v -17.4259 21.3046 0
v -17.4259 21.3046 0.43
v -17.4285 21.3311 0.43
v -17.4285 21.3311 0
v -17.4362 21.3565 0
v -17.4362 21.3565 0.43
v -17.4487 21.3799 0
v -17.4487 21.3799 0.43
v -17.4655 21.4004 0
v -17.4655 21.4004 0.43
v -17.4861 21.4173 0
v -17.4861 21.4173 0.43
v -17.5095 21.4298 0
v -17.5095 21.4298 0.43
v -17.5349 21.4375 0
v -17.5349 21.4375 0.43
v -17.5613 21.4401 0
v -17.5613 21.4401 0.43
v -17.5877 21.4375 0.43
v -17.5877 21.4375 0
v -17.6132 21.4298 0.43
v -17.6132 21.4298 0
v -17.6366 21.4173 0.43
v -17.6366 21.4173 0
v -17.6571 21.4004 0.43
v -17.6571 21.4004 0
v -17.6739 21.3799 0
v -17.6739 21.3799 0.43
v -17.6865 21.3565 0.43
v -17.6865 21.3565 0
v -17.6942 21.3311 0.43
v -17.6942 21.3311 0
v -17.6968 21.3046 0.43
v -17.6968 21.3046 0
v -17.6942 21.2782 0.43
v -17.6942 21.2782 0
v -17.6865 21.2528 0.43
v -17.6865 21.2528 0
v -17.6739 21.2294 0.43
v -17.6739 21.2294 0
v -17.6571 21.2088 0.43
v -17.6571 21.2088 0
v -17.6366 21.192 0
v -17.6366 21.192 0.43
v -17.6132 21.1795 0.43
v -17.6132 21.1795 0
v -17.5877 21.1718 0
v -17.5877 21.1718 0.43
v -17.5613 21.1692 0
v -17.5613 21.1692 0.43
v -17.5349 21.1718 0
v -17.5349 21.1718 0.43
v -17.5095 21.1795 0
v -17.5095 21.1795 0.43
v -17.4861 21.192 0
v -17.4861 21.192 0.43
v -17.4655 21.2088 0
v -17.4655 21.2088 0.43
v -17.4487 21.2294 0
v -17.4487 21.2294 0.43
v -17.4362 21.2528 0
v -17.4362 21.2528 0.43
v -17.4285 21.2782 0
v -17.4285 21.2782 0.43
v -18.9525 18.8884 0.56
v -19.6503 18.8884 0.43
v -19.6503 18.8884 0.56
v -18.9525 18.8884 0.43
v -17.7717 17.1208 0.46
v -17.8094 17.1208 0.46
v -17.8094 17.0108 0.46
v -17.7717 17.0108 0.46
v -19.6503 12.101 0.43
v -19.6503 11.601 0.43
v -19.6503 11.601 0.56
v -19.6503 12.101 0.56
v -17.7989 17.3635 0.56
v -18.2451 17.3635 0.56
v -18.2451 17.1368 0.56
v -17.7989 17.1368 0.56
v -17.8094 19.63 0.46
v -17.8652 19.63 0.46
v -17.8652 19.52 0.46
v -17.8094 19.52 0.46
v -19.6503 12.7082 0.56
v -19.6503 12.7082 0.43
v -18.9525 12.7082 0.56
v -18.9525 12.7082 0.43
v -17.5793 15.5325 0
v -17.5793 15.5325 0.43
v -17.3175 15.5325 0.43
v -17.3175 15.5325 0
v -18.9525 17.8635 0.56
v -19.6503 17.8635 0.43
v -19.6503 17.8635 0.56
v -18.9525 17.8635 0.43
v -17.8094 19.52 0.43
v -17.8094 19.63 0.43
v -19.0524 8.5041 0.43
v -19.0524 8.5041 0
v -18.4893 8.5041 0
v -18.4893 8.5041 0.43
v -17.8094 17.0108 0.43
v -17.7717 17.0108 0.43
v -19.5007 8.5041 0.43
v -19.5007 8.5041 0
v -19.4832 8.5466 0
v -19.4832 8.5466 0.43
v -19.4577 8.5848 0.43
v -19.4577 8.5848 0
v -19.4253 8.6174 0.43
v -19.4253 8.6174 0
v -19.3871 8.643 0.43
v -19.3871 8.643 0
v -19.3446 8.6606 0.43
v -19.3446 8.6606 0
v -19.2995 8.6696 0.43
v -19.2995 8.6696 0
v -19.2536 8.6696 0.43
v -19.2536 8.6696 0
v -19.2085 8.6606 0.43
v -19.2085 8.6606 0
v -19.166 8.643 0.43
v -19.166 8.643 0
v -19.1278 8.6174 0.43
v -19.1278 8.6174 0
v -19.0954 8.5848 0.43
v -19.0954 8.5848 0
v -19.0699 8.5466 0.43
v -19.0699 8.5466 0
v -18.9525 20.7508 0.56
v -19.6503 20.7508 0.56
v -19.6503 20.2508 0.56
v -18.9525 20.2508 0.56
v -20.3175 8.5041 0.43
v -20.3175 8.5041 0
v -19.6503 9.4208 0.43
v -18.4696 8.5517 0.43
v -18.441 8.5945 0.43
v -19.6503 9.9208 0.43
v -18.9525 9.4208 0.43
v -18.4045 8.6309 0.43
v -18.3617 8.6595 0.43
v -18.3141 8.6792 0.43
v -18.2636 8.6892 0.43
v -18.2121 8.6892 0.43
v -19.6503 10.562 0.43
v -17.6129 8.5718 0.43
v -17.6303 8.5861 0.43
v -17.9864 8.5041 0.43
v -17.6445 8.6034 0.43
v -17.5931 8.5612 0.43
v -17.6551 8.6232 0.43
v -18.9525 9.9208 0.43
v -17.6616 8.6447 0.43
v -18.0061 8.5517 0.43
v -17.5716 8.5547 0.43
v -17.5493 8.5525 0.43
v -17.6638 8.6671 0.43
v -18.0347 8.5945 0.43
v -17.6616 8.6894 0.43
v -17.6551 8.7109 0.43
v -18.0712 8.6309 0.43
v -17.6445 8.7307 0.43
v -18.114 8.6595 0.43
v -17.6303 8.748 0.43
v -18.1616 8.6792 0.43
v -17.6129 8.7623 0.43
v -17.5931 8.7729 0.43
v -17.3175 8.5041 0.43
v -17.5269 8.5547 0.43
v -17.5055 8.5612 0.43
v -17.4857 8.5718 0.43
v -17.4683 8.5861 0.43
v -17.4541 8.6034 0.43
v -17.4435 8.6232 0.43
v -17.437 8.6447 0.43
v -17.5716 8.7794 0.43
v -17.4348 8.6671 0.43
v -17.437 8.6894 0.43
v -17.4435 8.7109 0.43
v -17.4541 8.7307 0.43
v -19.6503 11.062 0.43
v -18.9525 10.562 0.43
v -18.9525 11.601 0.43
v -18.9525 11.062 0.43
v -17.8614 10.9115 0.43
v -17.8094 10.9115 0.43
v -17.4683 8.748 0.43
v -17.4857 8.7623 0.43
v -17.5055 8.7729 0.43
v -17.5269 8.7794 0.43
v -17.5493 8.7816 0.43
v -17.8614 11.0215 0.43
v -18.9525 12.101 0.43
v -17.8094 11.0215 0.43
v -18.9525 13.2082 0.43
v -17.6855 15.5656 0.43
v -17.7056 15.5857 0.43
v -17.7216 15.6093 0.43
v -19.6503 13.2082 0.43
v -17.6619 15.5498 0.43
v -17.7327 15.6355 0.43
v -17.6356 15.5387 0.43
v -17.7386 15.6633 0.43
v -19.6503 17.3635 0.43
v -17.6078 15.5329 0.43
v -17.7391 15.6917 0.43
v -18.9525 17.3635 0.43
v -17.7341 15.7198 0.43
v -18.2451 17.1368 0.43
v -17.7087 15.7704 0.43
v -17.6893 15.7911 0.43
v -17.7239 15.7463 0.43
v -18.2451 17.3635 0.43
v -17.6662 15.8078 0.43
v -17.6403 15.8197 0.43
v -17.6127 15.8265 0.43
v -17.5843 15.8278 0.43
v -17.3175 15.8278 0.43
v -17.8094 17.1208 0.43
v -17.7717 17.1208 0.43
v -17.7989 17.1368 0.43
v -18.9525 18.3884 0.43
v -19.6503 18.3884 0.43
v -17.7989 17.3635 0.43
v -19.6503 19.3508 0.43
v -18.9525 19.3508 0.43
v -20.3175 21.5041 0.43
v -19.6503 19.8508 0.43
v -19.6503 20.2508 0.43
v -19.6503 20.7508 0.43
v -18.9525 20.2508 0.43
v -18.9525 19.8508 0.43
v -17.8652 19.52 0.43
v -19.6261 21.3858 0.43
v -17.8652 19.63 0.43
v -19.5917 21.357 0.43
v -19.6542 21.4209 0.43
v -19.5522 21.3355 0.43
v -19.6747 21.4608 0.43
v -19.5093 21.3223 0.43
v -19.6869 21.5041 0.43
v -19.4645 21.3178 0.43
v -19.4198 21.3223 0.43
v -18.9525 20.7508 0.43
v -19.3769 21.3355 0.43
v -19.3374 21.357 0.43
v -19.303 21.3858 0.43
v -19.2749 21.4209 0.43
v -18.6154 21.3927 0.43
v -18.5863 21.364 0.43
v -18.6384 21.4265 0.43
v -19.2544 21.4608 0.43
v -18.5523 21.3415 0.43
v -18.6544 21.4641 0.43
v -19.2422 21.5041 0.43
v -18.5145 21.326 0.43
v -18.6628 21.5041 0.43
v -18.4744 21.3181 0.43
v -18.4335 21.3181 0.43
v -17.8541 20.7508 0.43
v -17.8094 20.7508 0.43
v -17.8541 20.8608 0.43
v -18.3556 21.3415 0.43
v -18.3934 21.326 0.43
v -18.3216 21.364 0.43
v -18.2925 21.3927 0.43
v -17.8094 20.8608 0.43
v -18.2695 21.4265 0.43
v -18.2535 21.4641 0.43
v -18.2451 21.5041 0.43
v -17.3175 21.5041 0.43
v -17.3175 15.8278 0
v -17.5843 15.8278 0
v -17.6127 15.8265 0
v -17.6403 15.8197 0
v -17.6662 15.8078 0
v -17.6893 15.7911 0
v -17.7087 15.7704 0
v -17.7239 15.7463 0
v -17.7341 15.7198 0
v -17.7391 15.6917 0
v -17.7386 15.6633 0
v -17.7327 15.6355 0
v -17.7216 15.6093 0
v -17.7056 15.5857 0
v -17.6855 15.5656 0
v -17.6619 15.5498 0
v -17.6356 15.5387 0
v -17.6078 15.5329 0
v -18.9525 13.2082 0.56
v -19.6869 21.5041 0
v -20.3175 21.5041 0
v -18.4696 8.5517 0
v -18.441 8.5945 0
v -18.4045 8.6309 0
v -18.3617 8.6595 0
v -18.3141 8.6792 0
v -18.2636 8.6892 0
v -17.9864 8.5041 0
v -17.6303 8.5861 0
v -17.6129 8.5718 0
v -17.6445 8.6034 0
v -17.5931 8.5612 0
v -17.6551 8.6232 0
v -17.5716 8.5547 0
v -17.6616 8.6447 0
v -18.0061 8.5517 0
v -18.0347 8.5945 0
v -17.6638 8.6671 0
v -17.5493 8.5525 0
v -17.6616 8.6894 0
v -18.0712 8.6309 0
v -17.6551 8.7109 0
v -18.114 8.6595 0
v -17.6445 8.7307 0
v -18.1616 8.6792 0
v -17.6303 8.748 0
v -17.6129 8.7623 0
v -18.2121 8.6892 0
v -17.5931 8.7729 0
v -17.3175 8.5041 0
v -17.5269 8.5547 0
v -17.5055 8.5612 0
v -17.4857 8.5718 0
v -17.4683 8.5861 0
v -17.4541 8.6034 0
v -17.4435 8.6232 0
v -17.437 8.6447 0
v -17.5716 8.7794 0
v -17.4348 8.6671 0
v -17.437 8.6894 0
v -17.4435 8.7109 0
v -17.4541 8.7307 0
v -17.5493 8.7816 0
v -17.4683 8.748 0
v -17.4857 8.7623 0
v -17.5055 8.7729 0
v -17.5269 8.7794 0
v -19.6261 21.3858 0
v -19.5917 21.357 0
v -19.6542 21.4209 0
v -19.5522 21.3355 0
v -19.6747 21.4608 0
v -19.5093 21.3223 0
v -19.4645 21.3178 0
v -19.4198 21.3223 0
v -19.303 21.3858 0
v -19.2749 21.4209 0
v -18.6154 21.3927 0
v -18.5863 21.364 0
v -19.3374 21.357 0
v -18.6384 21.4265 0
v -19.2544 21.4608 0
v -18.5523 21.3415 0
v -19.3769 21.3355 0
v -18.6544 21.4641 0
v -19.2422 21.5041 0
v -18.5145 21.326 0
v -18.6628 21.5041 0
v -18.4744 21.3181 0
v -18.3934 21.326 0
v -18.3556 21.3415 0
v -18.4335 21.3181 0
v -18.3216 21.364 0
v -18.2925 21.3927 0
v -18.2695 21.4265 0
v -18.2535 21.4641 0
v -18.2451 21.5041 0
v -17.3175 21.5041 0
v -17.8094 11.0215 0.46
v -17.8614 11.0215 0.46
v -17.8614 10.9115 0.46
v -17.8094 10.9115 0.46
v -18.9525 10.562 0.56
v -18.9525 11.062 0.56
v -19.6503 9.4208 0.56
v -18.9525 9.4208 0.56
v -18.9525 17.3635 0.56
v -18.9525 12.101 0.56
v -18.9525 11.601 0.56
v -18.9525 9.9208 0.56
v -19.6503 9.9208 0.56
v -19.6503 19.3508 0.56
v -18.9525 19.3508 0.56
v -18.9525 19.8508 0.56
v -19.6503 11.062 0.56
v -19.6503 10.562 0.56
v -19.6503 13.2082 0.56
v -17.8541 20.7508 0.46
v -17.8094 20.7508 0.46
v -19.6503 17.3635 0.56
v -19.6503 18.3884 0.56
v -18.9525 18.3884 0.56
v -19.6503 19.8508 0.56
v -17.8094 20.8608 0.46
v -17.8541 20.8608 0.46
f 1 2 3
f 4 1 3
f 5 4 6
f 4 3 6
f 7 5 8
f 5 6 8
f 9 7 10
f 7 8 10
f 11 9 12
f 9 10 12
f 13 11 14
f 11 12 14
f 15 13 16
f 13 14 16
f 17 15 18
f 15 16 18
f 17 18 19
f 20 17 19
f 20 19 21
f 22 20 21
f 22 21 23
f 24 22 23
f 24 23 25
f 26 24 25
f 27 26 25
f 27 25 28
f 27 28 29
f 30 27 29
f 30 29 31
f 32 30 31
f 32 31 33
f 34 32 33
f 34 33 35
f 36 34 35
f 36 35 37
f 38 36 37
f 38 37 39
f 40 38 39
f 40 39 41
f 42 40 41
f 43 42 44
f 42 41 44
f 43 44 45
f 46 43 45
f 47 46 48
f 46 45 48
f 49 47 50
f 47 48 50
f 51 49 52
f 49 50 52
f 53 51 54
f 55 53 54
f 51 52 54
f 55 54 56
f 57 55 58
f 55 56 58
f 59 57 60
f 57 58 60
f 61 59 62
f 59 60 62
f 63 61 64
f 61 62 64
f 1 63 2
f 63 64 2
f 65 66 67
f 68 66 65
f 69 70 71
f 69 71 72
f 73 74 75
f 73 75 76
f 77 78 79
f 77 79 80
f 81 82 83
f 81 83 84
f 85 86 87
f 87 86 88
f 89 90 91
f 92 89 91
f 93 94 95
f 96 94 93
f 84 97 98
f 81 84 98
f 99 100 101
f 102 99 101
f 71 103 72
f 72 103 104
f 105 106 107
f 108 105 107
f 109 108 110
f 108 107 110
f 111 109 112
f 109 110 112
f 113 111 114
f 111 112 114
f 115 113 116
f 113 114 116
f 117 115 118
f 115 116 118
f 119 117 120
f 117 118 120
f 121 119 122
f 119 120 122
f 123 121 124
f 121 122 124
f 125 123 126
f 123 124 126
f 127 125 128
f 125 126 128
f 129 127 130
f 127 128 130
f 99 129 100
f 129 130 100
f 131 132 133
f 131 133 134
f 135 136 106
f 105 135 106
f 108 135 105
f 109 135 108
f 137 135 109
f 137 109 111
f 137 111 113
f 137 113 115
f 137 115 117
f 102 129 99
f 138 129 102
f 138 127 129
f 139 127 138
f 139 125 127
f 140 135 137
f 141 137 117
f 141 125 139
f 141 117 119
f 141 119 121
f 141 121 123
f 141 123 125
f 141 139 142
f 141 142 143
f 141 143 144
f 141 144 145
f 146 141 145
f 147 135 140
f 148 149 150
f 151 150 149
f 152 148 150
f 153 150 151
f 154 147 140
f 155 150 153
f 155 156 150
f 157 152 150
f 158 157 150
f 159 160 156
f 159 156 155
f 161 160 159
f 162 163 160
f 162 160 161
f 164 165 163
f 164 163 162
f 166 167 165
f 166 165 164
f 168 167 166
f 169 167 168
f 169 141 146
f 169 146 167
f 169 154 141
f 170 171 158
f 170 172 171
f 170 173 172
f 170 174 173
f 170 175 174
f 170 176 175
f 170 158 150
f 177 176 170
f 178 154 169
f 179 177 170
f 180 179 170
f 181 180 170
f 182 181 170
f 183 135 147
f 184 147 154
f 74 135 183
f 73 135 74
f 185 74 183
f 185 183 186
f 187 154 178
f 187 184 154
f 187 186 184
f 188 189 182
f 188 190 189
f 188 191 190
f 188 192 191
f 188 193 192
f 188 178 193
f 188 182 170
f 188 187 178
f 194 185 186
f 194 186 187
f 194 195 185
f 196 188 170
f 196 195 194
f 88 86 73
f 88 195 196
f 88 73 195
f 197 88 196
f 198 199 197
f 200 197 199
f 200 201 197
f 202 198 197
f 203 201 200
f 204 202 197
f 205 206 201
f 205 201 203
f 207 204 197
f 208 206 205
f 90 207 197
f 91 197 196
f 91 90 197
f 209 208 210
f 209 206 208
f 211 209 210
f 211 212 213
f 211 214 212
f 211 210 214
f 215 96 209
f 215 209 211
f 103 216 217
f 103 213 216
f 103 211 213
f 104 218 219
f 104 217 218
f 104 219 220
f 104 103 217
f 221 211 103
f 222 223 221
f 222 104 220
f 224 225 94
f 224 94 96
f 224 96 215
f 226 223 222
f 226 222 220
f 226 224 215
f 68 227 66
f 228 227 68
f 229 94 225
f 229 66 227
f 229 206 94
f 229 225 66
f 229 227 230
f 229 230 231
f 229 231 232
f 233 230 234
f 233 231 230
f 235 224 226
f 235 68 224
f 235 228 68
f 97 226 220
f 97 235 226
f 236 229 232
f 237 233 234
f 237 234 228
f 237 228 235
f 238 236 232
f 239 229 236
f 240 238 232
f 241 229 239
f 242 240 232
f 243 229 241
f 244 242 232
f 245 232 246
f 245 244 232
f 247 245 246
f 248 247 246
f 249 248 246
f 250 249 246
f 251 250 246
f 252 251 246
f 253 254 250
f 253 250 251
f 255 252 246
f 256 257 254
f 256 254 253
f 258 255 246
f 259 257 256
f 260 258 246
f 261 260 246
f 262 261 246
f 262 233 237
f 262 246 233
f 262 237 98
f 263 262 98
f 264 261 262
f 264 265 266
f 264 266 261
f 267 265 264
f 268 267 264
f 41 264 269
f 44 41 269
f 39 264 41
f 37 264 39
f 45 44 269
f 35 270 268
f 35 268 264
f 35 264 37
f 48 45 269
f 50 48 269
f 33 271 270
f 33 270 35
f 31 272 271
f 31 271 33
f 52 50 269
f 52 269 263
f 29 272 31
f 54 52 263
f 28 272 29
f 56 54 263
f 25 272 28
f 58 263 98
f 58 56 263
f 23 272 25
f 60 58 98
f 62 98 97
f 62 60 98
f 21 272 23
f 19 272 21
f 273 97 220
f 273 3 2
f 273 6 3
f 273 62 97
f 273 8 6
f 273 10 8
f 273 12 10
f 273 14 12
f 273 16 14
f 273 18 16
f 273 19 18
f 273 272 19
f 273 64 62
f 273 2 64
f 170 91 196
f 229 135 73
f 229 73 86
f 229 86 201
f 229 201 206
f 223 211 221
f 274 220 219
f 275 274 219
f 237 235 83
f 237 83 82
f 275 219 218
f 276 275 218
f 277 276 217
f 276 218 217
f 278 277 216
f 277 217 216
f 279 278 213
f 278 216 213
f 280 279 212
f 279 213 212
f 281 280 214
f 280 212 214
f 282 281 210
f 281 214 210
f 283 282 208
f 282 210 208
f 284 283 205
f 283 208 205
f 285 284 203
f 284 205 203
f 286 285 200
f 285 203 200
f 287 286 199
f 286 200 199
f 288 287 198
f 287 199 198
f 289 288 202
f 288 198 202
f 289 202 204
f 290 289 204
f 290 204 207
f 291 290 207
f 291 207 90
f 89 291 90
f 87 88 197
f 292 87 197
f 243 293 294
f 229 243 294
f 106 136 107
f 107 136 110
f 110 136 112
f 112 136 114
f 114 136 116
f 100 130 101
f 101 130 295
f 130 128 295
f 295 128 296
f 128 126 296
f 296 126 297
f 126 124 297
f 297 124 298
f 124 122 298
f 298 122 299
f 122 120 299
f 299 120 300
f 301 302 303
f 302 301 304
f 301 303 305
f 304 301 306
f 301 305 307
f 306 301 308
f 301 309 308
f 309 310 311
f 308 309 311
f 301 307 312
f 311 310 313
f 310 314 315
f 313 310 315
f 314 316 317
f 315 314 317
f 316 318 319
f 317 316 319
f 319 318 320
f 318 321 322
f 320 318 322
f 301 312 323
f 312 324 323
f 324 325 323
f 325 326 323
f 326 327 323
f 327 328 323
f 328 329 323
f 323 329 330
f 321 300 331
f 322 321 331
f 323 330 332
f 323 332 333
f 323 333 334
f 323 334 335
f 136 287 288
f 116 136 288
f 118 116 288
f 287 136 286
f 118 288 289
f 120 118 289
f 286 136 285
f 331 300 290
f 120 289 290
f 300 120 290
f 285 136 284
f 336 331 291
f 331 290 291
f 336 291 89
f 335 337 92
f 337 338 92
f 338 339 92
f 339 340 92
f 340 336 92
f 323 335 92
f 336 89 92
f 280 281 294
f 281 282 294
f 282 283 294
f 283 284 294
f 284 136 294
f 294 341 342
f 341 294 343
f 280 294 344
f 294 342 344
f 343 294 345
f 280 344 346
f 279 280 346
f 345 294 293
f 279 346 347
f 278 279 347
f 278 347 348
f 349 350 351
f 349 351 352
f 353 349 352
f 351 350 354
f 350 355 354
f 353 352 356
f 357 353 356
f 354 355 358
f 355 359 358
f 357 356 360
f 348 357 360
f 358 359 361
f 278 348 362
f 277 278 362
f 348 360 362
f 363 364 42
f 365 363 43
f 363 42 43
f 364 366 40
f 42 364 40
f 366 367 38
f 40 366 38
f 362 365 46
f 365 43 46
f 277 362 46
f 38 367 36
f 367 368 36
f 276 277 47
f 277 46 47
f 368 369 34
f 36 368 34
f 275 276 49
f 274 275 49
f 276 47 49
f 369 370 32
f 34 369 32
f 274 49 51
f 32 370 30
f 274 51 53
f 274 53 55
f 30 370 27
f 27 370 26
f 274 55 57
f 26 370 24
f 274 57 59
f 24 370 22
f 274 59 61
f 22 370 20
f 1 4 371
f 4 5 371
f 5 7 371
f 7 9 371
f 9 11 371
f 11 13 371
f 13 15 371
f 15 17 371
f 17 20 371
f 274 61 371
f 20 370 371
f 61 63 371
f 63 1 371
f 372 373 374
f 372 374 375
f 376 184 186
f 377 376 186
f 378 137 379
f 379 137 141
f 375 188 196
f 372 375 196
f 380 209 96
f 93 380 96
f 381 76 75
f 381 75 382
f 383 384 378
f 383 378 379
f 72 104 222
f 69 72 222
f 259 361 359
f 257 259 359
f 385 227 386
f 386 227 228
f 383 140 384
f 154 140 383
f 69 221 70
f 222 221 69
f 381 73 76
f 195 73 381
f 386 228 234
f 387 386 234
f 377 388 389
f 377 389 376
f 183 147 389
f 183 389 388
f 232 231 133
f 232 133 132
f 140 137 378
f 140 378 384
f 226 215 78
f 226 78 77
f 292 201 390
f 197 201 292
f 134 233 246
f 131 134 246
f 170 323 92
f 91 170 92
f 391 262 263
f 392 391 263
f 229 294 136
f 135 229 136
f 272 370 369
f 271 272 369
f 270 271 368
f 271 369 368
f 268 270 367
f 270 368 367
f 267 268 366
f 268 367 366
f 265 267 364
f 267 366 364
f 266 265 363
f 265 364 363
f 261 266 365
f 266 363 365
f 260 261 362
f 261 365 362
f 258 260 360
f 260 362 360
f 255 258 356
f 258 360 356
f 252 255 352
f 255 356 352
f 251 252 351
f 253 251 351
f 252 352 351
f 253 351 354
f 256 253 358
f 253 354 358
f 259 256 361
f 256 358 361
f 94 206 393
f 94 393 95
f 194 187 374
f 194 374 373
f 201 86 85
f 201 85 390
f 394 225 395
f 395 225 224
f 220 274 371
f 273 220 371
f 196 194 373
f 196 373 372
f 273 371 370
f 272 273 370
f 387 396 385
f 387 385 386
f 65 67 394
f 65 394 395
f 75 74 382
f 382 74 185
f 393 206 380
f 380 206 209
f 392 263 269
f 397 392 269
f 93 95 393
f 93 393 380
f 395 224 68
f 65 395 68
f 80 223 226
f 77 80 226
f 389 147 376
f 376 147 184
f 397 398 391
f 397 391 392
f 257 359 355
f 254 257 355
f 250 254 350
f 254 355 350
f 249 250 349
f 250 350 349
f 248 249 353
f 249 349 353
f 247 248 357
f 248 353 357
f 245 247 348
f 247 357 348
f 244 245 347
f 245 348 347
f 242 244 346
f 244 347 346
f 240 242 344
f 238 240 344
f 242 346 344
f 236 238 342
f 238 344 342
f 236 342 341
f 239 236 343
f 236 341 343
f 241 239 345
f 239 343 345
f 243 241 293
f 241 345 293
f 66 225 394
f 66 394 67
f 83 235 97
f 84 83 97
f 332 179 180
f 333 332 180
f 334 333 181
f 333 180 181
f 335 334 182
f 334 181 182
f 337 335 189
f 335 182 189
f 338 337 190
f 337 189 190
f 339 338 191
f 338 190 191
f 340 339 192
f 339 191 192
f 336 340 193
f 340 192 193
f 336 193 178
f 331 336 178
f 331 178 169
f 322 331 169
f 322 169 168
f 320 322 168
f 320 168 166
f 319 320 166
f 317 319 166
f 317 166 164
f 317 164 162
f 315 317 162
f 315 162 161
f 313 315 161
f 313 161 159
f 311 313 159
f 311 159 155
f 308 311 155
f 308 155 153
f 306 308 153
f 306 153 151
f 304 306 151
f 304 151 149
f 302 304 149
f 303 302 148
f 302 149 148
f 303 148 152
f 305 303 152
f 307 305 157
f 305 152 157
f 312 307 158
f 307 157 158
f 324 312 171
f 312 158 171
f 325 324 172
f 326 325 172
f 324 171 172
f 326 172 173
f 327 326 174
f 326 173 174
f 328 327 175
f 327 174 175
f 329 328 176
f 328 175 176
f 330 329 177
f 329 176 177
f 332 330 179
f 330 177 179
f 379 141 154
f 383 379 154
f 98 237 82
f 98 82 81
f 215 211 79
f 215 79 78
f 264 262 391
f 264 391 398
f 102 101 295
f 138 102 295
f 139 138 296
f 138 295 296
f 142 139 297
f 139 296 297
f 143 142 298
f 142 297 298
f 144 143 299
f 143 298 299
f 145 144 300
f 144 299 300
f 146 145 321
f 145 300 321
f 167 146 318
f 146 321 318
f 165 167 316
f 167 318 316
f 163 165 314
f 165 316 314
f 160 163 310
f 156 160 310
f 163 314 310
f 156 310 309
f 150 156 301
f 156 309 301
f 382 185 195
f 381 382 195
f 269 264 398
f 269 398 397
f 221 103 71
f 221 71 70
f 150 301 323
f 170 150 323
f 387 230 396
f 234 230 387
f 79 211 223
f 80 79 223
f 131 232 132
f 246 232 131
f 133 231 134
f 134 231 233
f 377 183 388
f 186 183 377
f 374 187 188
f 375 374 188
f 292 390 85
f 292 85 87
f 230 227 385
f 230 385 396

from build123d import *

# Parameters (mm, degrees)
F1_DEPTH = 0.43
F2_R     = 0.114538
F2_R_2   = 0.135459
F3_DEPTH = 25
F4_W     = 0.697841
F4_H     = 0.5
F4_W_2   = 0.446198
F4_H_2   = 0.226708
F5_DEPTH = 0.13
F7_DEPTH = 25
F8_W     = 0.044617
F8_H     = 0.11
F8_W_2   = 0.05577
F8_W_3   = 0.03778
F8_W_4   = 0.051917
F9_DEPTH = 0.03


with BuildPart() as f1:
    # F0 (on Top) → F1 (new body)
    with BuildSketch(Plane.XY):
        with BuildLine():
            Line((-17.317478, 8.504073), (-17.317478, 21.504073))
            Line((-17.317478, 21.504073), (-18.245058, 21.504073))
            ThreePointArc((-18.245058, 21.504073), (-18.453947, 21.317083), (-18.662836, 21.504073))
            Line((-18.662836, 21.504073), (-19.242154, 21.504073))
            ThreePointArc((-19.242154, 21.504073), (-19.46455, 21.317806), (-19.686945, 21.504073))
            Line((-19.686945, 21.504073), (-20.317478, 21.504073))
            Line((-20.317478, 21.504073), (-20.317478, 8.504073))
            Line((-20.317478, 8.504073), (-19.500678, 8.504073))
            ThreePointArc((-19.500678, 8.504073), (-19.276541, 8.670717), (-19.052403, 8.504073))
            Line((-19.052403, 8.504073), (-18.489325, 8.504073))
            ThreePointArc((-18.489325, 8.504073), (-18.237854, 8.690502), (-17.986383, 8.504073))
            Line((-17.986383, 8.504073), (-17.317478, 8.504073))
        make_face()
    extrude(amount=F1_DEPTH)

    # F2 (on face) → F3 (cut)
    with BuildSketch(Plane.XY.offset(0.43)):
        with Locations((-17.549288, 8.667056)):
            Circle(F2_R)
        with Locations((-17.561315, 21.304632)):
            Circle(F2_R_2)
    extrude(amount=-F3_DEPTH, mode=Mode.SUBTRACT)

    # F4 (on face) → F5 (join)
    with BuildSketch(Plane.XY.offset(0.43)):
        with Locations((-19.301415, 20.500756)):
            Rectangle(F4_W, F4_H)
        with Locations((-19.301415, 19.600825)):
            Rectangle(F4_W, F4_H)
        with Locations((-19.301415, 18.6384)):
            Rectangle(F4_W, F4_H)
        with Locations((-19.301415, 17.613479)):
            Rectangle(F4_W, F4_H)
        with Locations((-18.021959, 17.250125)):
            Rectangle(F4_W_2, F4_H_2)
        with Locations((-19.301415, 12.958157)):
            Rectangle(F4_W, F4_H)
        with Locations((-19.301415, 11.851003)):
            Rectangle(F4_W, F4_H)
        with Locations((-19.301415, 10.811981)):
            Rectangle(F4_W, F4_H)
        with Locations((-19.301415, 9.670762)):
            Rectangle(F4_W, F4_H)
    extrude(amount=F5_DEPTH)

    # F6 (on face) → F7 (cut)
    with BuildSketch(Plane.XY.offset(0.43)):
        with BuildLine():
            Line((-17.317478, 15.827807), (-17.584291, 15.827807))
            ThreePointArc((-17.584291, 15.827807), (-17.73952, 15.677507), (-17.579334, 15.532503))
            Line((-17.579334, 15.532503), (-17.317478, 15.532503))
            Line((-17.317478, 15.532503), (-17.317478, 15.827807))
        make_face()
    extrude(amount=-F7_DEPTH, mode=Mode.SUBTRACT)

    # F8 (on face) → F9 (join)
    with BuildSketch(Plane.XY.offset(0.43)):
        with Locations((-17.831758, 20.805756)):
            Rectangle(F8_W, F8_H)
        with Locations((-17.837335, 19.574996)):
            Rectangle(F8_W_2, F8_H)
        with Locations((-17.79056, 17.065835)):
            Rectangle(F8_W_3, F8_H)
        with Locations((-17.835408, 10.966537)):
            Rectangle(F8_W_4, F8_H)
    extrude(amount=F9_DEPTH)


solid = f1.part
